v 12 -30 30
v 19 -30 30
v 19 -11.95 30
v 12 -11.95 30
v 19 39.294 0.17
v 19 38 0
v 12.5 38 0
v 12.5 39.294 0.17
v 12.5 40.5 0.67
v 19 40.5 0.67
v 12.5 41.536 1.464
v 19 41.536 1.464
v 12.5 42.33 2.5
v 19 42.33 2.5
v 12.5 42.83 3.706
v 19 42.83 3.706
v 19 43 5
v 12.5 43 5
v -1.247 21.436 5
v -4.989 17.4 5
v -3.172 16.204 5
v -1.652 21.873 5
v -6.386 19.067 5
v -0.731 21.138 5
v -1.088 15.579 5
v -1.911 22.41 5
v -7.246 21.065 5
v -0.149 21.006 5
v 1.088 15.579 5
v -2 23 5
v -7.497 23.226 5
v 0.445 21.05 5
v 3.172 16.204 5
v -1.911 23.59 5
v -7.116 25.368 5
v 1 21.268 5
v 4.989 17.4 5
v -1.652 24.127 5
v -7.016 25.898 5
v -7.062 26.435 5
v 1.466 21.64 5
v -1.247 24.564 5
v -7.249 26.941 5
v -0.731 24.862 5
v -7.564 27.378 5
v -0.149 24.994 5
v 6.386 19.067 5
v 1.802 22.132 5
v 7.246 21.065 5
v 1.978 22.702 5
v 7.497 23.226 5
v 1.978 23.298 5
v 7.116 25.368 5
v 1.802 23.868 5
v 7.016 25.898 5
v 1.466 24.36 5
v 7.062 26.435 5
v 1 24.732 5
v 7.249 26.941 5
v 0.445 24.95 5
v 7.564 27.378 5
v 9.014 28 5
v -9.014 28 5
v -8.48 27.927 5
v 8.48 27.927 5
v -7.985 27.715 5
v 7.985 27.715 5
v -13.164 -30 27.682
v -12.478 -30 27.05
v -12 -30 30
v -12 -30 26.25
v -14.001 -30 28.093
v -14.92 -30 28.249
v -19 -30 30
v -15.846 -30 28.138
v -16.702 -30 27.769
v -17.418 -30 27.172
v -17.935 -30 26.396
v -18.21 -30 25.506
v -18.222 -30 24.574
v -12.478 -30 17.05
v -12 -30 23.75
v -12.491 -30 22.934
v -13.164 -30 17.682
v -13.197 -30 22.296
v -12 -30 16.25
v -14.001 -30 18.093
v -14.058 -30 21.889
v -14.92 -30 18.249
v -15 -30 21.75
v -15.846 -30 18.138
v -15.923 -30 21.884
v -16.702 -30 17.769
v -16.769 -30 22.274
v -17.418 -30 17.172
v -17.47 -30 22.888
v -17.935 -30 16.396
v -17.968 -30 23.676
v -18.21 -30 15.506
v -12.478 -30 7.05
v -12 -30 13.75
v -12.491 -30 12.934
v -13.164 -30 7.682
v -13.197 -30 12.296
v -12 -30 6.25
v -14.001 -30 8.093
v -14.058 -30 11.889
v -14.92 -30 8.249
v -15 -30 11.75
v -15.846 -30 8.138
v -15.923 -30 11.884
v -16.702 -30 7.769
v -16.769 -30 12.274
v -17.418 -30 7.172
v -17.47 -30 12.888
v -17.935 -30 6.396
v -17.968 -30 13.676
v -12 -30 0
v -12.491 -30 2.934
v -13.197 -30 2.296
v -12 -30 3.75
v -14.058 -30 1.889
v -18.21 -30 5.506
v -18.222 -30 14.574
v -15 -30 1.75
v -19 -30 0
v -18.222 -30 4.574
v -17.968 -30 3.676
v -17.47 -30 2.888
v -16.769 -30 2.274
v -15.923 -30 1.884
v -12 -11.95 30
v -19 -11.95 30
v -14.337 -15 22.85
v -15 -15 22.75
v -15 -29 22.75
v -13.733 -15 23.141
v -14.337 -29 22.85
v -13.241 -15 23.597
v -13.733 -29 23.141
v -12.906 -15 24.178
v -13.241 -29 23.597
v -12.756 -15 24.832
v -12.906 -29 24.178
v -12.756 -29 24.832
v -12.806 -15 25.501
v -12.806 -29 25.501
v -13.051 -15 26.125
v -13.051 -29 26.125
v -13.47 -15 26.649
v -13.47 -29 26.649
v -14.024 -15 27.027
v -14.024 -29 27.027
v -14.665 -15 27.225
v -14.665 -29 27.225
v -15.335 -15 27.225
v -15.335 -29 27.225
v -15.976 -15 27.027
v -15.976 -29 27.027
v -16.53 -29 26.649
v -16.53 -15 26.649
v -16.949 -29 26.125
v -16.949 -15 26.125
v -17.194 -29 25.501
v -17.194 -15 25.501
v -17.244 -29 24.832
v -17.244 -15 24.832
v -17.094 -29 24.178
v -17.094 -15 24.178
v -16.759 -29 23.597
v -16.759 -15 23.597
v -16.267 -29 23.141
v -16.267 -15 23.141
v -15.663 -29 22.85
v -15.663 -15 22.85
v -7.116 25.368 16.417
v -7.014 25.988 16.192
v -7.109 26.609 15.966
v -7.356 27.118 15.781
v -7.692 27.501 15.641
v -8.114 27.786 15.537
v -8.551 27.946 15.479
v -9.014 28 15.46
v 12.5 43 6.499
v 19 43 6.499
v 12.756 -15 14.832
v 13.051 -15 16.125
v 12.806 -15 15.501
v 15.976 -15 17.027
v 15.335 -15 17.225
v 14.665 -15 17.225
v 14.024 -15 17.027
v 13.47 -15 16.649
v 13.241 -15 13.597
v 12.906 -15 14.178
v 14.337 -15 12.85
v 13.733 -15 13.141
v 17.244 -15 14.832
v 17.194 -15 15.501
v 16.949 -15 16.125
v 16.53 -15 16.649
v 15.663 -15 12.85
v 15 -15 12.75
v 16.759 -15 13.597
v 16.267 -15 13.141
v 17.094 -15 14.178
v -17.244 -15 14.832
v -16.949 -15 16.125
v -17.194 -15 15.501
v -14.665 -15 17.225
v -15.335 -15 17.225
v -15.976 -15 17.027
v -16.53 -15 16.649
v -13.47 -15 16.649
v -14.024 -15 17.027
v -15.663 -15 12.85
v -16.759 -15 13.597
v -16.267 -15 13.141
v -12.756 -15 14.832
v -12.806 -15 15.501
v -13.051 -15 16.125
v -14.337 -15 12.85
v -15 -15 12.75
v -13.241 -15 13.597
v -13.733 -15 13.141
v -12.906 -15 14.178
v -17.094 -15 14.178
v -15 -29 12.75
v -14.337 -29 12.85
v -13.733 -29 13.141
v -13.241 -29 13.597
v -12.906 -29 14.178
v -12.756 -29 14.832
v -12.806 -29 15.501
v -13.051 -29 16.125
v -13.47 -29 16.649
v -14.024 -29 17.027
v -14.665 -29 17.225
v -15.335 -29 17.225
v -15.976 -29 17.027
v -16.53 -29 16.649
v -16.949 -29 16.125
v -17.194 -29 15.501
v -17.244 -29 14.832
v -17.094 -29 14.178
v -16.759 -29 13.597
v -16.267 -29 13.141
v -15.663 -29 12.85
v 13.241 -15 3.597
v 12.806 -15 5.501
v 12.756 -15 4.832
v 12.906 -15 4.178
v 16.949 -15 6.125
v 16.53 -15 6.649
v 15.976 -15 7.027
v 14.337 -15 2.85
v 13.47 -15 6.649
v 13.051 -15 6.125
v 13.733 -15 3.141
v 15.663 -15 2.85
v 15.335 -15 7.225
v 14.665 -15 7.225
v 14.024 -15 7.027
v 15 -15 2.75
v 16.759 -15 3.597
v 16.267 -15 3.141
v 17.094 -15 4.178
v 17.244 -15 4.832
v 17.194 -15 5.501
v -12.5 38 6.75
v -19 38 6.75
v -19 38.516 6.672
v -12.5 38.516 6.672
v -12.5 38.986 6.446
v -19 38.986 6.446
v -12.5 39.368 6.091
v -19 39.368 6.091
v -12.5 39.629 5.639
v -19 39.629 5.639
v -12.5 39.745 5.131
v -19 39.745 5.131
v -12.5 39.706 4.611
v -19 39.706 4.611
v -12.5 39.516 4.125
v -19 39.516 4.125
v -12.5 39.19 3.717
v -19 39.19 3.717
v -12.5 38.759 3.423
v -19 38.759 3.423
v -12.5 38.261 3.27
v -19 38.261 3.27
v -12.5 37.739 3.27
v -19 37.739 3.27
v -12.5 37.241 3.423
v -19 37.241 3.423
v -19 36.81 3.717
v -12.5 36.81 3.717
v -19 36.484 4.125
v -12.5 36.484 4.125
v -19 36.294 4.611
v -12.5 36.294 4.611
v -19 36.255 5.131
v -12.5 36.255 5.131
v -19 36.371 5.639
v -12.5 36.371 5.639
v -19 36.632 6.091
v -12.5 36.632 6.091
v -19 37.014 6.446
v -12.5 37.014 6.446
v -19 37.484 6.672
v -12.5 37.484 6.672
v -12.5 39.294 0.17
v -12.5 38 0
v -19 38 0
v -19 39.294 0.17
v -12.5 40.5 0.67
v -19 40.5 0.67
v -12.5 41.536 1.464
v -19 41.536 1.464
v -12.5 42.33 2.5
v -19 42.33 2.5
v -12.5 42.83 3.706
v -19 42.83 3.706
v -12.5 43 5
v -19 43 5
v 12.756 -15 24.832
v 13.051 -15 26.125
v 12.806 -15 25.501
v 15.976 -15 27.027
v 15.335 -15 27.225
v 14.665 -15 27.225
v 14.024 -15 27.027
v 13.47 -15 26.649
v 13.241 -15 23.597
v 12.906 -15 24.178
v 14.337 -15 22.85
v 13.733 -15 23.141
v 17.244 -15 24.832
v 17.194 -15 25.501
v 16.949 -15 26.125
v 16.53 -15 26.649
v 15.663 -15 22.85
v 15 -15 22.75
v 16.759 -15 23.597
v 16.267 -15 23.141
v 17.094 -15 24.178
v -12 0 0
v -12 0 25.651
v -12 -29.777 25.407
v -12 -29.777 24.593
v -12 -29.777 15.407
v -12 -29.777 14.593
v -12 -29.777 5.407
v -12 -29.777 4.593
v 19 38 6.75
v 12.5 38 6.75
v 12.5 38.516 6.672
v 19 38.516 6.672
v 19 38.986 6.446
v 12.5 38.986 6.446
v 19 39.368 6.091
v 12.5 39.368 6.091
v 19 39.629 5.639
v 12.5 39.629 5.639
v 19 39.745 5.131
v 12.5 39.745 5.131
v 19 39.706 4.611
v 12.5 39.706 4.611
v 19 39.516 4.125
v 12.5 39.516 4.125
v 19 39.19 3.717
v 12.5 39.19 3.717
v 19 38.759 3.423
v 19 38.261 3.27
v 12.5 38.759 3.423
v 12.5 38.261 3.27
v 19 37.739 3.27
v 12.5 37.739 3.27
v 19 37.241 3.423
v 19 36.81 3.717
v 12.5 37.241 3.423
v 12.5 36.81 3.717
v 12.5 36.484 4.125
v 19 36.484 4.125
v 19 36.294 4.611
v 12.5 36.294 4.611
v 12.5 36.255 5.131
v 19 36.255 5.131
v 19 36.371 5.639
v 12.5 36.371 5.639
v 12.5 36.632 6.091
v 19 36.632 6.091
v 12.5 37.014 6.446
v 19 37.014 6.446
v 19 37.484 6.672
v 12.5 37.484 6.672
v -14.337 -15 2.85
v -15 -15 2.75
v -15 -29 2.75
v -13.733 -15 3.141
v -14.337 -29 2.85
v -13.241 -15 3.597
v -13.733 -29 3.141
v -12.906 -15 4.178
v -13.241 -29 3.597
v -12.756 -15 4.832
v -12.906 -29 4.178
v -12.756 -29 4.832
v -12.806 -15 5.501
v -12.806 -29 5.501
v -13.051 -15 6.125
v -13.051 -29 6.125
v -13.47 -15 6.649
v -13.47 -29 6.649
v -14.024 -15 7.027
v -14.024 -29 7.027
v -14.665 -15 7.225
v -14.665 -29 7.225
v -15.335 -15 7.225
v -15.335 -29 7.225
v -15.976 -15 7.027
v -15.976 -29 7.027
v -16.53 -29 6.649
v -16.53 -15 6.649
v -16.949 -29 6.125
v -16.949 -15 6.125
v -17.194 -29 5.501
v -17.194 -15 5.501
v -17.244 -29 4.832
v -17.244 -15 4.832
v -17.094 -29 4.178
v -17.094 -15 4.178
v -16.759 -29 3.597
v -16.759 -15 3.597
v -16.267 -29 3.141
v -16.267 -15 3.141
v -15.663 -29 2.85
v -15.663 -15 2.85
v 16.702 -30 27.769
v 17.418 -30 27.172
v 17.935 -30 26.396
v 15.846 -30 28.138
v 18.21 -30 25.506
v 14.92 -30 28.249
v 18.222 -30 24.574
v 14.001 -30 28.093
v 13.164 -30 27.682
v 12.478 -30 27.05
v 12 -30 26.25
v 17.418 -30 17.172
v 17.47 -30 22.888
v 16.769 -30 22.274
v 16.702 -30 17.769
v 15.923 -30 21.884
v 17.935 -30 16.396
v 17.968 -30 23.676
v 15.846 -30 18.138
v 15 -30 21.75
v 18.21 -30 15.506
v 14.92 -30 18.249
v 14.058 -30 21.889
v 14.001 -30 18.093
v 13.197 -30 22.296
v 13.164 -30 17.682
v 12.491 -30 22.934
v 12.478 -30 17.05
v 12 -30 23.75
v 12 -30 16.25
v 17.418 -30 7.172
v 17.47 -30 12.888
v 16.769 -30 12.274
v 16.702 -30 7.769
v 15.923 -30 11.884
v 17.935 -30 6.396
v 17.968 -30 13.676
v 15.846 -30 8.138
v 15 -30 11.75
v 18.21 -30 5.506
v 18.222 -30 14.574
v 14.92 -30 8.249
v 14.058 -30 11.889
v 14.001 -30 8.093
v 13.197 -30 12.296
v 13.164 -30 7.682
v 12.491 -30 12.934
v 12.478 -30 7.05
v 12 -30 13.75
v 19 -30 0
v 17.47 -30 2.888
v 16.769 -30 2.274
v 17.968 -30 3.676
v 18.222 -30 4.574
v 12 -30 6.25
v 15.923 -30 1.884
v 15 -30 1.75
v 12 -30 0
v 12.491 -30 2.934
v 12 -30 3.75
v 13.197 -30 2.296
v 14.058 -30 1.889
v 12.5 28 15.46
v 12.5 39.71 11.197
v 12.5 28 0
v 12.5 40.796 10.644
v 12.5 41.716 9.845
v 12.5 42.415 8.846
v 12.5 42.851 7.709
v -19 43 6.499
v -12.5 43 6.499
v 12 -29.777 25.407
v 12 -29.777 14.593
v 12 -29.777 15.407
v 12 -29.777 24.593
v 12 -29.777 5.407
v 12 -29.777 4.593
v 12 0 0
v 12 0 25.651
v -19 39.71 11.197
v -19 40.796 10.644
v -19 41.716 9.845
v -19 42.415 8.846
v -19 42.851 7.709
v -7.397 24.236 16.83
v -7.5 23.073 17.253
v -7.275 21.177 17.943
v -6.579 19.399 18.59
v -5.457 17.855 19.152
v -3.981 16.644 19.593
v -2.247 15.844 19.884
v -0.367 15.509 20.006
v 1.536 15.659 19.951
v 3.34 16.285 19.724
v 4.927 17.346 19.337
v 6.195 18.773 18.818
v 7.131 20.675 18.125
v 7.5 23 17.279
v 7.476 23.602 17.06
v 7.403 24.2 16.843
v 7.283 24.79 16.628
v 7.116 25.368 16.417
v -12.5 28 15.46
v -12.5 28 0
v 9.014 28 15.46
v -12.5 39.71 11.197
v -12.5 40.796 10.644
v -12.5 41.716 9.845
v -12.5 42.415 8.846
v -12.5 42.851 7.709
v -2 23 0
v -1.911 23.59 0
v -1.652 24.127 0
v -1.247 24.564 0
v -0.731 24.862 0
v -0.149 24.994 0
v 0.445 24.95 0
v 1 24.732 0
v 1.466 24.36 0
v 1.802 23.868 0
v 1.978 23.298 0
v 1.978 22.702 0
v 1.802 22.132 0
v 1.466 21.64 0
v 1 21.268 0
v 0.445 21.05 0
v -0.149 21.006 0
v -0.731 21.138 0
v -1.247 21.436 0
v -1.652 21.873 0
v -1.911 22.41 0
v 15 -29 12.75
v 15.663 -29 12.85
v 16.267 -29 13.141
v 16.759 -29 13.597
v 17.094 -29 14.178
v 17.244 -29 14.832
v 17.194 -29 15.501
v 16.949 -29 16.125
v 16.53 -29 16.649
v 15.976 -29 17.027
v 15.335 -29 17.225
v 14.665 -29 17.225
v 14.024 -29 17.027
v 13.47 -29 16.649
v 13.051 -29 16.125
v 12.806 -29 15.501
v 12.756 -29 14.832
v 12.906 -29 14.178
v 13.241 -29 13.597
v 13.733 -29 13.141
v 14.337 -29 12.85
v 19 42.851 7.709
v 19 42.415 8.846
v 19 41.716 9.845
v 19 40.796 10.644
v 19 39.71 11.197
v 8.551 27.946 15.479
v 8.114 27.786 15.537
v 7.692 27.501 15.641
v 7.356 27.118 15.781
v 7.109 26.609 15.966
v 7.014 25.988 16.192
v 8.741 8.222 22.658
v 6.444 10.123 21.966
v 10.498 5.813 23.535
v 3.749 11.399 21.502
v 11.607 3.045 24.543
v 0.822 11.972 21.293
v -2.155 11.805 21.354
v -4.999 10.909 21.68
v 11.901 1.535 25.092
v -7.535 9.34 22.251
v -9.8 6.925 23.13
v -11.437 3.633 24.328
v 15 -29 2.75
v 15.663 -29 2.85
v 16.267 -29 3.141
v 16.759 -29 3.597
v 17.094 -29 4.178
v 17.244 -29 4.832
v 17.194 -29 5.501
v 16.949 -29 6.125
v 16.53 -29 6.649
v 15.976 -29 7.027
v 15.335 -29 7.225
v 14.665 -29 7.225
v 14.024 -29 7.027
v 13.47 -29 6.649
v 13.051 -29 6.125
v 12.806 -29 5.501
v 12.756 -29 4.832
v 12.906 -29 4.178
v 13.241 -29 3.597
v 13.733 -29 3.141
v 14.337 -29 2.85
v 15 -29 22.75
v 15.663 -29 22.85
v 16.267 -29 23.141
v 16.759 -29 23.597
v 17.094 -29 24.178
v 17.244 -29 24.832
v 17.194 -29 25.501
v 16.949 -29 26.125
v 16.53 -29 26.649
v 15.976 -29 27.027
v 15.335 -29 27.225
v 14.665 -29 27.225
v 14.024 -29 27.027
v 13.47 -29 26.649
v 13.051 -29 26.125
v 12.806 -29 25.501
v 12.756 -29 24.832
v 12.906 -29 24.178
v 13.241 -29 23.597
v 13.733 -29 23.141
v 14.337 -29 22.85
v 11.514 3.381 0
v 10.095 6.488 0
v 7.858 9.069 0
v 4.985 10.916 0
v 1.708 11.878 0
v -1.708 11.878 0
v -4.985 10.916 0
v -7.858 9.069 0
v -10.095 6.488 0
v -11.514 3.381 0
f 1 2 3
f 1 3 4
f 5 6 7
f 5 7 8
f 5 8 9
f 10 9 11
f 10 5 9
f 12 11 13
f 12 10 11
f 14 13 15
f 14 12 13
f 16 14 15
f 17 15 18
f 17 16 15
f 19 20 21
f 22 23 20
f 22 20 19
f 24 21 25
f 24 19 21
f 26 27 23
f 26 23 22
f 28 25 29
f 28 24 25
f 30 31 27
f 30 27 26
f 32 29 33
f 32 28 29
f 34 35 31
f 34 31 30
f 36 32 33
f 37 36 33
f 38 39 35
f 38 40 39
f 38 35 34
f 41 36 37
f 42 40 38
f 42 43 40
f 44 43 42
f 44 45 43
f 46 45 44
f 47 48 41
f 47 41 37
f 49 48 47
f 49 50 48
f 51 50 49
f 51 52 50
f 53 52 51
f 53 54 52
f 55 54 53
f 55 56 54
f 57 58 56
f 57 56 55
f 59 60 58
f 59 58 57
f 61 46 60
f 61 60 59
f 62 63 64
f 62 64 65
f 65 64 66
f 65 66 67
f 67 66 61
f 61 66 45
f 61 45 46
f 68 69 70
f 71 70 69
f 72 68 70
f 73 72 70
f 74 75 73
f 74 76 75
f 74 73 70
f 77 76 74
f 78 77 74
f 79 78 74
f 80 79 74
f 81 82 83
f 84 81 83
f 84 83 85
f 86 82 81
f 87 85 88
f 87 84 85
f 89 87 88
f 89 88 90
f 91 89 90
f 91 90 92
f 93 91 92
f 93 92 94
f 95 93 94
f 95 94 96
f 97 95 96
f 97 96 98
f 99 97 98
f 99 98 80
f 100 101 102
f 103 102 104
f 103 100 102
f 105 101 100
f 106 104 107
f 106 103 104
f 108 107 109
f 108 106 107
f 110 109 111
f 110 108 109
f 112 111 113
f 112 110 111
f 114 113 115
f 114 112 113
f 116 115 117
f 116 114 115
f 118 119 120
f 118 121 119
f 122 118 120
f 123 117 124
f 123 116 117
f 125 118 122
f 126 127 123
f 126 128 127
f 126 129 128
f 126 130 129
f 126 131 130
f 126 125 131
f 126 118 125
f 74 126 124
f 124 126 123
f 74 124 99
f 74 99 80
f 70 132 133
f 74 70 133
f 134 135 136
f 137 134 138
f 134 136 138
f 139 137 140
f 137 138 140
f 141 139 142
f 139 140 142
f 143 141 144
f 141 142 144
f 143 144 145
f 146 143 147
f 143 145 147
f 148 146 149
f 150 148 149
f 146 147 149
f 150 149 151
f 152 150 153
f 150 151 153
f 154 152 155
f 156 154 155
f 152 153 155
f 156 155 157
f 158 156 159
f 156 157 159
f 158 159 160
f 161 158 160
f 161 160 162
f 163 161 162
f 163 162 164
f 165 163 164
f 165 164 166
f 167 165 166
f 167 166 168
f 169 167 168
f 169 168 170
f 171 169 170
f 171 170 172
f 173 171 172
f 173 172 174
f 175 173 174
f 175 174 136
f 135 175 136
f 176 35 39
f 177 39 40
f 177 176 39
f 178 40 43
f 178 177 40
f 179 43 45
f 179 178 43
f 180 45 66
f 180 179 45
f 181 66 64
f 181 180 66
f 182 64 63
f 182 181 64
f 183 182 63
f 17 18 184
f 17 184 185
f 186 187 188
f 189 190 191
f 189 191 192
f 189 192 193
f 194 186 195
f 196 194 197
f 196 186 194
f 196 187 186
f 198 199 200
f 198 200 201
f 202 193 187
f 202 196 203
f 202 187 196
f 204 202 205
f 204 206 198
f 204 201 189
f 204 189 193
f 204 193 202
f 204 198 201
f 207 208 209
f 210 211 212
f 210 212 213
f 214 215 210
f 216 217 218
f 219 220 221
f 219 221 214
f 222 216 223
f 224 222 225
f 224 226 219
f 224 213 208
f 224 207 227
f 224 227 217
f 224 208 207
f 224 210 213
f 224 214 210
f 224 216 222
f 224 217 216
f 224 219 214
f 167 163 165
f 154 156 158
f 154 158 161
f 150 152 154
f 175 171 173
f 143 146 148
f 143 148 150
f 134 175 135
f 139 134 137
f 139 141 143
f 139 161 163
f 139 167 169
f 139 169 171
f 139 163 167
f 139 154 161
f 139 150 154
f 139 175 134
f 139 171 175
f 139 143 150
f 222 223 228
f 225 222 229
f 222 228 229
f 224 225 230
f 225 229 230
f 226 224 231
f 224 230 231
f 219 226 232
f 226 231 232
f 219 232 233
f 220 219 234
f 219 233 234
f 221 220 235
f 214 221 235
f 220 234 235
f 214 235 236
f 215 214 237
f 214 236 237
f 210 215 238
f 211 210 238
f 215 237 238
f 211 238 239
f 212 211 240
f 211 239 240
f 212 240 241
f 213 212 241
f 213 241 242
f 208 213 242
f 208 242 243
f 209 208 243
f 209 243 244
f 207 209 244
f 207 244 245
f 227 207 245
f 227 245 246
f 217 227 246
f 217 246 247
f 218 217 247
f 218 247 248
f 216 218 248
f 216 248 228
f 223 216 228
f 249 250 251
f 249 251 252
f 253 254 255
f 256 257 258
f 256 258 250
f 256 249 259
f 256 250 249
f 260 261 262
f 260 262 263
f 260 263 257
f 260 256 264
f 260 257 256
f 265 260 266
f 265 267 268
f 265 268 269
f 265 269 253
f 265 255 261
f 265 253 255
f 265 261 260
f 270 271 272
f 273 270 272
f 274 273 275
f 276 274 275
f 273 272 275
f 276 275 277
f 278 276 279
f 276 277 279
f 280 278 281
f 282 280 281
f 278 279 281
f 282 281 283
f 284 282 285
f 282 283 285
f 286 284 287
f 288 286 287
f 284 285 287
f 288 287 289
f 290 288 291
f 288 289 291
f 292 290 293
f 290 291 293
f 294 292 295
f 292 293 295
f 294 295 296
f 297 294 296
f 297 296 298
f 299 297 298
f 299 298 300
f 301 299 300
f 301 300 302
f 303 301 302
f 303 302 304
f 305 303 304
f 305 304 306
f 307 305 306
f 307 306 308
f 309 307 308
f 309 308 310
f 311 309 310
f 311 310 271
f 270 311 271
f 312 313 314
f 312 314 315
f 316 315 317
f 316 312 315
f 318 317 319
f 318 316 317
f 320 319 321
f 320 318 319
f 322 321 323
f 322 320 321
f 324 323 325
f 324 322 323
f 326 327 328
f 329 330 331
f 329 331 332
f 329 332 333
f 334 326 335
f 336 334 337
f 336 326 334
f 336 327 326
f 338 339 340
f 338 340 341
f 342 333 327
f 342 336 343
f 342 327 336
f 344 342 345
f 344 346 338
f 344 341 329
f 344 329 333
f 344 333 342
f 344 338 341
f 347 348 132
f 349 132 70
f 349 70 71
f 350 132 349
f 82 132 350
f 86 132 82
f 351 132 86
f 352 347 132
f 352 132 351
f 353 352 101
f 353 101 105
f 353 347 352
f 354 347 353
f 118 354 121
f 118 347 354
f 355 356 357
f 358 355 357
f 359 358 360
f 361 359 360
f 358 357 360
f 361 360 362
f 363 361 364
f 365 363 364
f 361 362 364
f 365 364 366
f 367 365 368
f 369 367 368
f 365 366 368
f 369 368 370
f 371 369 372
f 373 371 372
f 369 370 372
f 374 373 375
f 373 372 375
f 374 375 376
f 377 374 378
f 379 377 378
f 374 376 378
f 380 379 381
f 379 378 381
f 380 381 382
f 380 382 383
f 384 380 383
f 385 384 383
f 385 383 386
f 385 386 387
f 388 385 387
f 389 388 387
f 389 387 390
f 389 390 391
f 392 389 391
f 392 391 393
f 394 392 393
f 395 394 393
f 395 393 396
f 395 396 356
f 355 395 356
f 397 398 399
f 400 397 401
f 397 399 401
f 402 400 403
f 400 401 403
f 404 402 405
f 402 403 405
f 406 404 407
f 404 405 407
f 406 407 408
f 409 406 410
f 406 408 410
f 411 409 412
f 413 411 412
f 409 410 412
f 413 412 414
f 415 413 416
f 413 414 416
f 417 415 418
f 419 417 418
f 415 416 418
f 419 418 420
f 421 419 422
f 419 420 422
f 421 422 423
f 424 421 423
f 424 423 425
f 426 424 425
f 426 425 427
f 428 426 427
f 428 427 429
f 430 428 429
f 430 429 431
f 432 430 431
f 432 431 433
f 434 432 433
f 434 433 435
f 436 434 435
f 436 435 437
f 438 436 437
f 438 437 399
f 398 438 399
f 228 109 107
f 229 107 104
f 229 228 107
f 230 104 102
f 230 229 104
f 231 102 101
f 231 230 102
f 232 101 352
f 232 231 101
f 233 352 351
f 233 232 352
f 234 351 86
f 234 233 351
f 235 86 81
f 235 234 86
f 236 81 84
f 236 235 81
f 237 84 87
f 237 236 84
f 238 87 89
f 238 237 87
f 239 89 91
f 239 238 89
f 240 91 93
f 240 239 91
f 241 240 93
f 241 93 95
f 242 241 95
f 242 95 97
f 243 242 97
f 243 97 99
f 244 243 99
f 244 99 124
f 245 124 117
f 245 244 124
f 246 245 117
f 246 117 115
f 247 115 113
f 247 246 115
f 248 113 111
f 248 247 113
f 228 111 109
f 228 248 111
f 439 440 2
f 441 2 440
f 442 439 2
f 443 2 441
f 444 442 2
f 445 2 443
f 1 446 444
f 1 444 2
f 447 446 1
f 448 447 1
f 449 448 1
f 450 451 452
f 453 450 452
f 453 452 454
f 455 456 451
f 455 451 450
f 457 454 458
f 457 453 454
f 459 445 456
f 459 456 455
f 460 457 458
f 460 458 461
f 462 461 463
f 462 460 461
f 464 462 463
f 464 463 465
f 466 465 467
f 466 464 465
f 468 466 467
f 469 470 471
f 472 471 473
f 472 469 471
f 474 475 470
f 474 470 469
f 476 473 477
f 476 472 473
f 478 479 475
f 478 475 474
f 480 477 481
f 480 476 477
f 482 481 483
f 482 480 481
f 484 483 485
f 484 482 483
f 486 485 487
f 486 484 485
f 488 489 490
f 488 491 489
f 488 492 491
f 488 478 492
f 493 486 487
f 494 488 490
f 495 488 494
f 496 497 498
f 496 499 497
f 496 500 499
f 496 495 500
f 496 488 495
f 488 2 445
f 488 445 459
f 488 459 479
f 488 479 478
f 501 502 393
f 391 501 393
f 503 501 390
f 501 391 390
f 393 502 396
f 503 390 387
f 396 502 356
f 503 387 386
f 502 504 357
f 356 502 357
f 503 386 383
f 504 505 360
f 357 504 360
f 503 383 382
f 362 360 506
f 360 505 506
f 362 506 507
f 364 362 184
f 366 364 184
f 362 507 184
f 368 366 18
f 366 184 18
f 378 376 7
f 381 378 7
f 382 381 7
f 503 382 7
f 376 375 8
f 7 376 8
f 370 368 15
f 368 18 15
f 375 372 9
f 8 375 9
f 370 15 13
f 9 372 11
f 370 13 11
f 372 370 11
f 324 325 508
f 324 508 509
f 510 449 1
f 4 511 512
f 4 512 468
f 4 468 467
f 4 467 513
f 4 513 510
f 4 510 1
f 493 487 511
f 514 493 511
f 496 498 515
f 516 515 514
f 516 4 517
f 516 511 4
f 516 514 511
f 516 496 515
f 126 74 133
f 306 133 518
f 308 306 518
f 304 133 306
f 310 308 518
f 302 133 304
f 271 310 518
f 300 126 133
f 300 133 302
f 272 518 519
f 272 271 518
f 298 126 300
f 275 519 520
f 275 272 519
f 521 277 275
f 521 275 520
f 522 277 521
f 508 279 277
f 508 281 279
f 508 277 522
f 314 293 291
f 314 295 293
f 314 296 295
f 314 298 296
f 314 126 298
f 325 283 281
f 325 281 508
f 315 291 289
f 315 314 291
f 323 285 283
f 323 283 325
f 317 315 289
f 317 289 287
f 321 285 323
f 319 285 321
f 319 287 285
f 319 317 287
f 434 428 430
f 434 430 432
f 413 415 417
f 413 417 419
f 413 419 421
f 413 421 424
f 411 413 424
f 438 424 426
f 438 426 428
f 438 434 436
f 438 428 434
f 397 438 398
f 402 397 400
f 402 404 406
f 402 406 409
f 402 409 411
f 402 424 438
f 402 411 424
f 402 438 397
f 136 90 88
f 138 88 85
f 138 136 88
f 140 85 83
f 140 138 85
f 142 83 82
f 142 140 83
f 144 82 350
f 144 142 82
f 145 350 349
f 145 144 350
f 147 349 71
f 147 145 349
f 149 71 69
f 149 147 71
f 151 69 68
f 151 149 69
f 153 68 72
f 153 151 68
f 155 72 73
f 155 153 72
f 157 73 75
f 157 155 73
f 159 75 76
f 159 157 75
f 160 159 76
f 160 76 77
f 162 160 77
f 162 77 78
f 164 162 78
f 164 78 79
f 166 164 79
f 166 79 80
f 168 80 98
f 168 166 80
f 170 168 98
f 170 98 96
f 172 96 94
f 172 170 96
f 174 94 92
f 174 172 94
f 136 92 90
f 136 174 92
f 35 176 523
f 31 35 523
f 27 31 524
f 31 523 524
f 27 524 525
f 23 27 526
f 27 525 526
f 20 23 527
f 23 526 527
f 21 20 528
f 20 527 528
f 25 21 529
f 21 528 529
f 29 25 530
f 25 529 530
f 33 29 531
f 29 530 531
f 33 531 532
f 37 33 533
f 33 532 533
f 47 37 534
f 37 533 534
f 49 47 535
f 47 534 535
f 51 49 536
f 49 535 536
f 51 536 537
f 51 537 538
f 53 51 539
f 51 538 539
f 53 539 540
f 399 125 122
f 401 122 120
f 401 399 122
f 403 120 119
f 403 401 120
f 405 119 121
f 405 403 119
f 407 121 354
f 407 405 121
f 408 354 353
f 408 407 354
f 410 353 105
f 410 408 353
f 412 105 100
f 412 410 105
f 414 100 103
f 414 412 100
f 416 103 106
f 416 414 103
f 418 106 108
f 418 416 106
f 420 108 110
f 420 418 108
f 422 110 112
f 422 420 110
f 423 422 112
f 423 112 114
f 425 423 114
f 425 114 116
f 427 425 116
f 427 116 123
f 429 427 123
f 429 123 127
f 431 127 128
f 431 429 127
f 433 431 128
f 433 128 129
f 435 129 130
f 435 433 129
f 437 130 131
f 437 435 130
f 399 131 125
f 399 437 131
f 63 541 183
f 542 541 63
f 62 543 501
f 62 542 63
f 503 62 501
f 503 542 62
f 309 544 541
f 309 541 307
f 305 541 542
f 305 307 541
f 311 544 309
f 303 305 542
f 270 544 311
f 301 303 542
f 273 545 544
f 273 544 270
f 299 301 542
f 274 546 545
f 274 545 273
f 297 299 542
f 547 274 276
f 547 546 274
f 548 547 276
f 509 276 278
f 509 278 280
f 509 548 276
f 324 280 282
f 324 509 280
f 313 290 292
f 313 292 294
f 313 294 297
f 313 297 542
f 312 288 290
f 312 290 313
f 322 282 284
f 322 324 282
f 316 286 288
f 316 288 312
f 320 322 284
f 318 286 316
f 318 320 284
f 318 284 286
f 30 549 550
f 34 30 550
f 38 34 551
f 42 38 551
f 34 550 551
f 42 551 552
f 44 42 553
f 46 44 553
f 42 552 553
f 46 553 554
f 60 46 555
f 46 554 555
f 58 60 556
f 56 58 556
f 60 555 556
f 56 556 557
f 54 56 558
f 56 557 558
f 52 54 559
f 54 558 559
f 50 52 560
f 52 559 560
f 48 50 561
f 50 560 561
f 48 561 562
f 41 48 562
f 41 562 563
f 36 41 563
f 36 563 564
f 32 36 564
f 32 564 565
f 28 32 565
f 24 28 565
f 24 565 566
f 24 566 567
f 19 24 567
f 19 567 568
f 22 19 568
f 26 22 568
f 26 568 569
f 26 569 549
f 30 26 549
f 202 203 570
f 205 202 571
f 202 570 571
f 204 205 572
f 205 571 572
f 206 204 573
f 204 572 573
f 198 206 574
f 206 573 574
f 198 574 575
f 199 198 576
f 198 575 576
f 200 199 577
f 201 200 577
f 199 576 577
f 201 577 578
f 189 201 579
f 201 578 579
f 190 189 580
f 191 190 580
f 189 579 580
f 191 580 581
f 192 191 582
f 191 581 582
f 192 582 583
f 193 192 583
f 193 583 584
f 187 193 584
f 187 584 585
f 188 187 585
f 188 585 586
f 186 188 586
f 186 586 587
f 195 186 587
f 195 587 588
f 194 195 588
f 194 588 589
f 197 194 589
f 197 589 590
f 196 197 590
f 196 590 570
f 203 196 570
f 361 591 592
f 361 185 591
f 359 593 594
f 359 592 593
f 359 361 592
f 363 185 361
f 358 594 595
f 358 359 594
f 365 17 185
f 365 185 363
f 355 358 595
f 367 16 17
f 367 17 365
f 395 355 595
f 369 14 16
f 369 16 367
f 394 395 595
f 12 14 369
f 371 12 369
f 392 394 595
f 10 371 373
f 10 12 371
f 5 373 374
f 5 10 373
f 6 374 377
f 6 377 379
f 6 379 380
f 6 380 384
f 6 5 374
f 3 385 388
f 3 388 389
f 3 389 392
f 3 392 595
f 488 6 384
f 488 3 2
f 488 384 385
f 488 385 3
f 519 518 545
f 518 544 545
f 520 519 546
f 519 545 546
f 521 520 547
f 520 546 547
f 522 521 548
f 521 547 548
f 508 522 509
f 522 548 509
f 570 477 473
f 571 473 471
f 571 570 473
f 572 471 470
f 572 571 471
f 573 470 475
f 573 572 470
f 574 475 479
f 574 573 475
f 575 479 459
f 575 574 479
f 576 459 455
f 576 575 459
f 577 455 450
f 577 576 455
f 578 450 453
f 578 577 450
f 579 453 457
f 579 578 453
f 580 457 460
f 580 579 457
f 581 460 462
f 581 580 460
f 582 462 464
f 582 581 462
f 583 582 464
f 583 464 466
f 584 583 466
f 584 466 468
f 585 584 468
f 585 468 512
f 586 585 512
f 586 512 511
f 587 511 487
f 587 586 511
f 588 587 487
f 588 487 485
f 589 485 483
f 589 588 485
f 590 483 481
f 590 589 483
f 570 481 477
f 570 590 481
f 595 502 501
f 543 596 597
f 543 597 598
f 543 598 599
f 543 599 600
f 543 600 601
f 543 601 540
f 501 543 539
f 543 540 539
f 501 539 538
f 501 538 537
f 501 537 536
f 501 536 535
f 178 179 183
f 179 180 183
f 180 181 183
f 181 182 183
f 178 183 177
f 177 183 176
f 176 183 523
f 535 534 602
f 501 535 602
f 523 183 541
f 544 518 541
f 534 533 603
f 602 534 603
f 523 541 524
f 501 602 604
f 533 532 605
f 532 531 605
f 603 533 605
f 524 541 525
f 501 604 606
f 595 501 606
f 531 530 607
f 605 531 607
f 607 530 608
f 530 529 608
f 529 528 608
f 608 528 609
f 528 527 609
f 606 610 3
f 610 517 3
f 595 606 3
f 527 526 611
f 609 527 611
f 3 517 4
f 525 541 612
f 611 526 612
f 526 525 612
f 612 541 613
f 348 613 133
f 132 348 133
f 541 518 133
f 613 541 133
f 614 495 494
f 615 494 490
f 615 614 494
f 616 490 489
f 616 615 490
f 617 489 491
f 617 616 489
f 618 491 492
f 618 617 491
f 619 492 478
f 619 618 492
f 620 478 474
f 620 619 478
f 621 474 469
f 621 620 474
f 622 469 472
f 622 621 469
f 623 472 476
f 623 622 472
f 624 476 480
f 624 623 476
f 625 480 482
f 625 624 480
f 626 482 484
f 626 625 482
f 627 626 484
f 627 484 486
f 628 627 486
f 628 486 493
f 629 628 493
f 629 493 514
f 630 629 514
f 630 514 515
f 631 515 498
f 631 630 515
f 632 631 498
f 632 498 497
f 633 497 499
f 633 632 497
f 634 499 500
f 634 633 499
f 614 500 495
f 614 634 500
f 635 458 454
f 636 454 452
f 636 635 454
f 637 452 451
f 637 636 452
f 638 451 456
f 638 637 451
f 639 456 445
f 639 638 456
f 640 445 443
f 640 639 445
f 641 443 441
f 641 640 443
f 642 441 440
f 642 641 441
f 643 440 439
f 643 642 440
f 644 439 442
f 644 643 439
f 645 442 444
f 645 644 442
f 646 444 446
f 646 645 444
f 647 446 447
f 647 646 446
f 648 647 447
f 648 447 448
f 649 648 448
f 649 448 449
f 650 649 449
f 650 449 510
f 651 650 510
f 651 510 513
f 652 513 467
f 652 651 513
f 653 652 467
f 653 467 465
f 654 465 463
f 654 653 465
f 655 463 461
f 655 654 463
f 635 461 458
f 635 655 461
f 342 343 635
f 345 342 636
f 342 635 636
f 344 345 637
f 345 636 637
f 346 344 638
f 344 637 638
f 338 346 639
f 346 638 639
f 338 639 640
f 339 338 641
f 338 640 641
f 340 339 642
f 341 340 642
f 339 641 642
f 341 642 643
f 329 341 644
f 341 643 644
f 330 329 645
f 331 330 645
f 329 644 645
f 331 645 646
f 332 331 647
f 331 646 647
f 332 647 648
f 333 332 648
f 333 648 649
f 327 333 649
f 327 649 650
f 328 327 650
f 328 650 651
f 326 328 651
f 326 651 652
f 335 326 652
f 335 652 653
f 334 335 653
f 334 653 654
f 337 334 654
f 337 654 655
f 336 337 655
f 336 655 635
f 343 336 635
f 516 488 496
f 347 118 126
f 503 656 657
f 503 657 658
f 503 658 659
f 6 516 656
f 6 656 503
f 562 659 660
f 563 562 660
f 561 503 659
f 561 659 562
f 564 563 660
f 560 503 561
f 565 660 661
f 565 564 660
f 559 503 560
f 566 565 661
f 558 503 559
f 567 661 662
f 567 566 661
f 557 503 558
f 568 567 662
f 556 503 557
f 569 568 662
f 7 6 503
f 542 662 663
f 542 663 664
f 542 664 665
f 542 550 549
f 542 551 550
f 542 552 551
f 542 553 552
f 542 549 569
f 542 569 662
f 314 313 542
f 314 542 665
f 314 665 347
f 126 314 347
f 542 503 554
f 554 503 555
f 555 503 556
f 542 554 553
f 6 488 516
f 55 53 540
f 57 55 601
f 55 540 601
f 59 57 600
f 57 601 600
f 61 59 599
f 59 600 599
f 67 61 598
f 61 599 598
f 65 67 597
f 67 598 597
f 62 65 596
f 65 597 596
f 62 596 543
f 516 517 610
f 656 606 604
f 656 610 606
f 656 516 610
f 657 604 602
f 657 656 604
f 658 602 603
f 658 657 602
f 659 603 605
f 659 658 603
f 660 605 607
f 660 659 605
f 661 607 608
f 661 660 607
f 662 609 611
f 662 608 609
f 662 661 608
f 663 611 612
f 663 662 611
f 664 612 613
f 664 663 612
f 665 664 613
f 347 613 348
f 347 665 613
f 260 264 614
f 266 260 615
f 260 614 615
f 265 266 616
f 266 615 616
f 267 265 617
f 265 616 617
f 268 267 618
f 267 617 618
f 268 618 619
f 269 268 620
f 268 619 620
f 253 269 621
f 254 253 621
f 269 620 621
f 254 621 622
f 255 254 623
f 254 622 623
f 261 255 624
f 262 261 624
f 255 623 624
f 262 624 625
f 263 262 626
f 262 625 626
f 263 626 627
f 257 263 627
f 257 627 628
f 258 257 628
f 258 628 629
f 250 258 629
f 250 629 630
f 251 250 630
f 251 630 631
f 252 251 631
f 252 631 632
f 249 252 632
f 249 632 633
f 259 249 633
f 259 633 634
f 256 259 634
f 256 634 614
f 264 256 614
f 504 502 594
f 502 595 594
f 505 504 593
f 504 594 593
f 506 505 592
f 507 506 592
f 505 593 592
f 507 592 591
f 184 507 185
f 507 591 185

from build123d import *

# Parameters (mm, degrees)
BOSS_EXTRUDE1_DEPTH = 30
SKETCH2_R           = 2.25
CUT_EXTRUDE1_DEPTH  = 15
FILLET1_R           = 5
CHAMFER1_SIZE       = 20
CHAMFER1_SIZE_2     = 54.949548389
SKETCH3_W           = 25
SKETCH3_H           = 39.596952294
CUT_EXTRUDE2_DEPTH  = 15
SKETCH4_R           = 1.75
CUT_EXTRUDE3_DEPTH  = 65.75337829
CHAMFER2_SIZE       = 1
SKETCH5_R           = 2
CUT_EXTRUDE4_DEPTH  = 56.767373974
SKETCH6_R           = 7.5
CUT_EXTRUDE5_DEPTH  = 25
FILLET2_R           = 2
FILLET3_R           = 5


with BuildPart() as part:
    # Sketch1 → Boss-Extrude1 (new body)
    with BuildSketch(Plane.XY):
        with BuildLine():
            Line((-12, 0), (-12, -30))
            Line((-12, -30), (-19, -30))
            Line((-19, -30), (-19, 43))
            Line((-19, 43), (19, 43))
            Line((19, 43), (19, -30))
            Line((19, -30), (12, -30))
            Line((12, -30), (12, 0))
            ThreePointArc((12, 0), (0, 12), (-12, 0))
        make_face()
    extrude(amount=BOSS_EXTRUDE1_DEPTH)

    # Sketch2 → Cut-Extrude1 (cut)
    with BuildSketch(Plane.XZ.offset(30)):
        with Locations(Location((-15, 5, 0), (0, 0, 270))):
            Circle(SKETCH2_R)
        with Locations(Location((15, 5, 0), (0, 0, 270))):
            Circle(SKETCH2_R)
        with Locations(Location((-15, 15, 0), (0, 0, 270))):
            Circle(SKETCH2_R)
        with Locations(Location((15, 15, 0), (0, 0, 270))):
            Circle(SKETCH2_R)
        with Locations(Location((-15, 25, 0), (0, 0, 270))):
            Circle(SKETCH2_R)
        with Locations(Location((15, 25, 0), (0, 0, 270))):
            Circle(SKETCH2_R)
    extrude(amount=-CUT_EXTRUDE1_DEPTH, mode=Mode.SUBTRACT)

    # Fillet1
    fillet1_edges = [part.edges().sort_by_distance(p)[0] for p in [
        (0, 43, 0),
    ]]
    fillet(fillet1_edges, radius=FILLET1_R)

    # Chamfer1
    # the kernel refuses this chamfer: 54.949548389, 20 mm, written as the material it takes off along each edge
    with BuildSketch(Plane(origin=(-161.549828987, 43, 30), x_dir=(0, 0.09904090225205052, -0.9950833631817486), z_dir=(1, 0, 0))) as chamfer1_piece_1:
        Polygon((CHAMFER1_SIZE * 0.995083363182, -CHAMFER1_SIZE * 0.0990409022521), (-CHAMFER1_SIZE_2 * 0.0990409022522, -CHAMFER1_SIZE_2 * 0.995083363183), (0, 0), align=None)
    extrude(amount=323.099657974, mode=Mode.SUBTRACT)

    # Sketch3 → Cut-Extrude2 (cut)
    with BuildSketch(Plane(origin=(0, 43, 0), x_dir=(1, 0, 0), z_dir=(0, 1, 0))):
        Rectangle(SKETCH3_W, SKETCH3_H)
    extrude(amount=-CUT_EXTRUDE2_DEPTH, mode=Mode.SUBTRACT)

    # Sketch4 → Cut-Extrude3 (cut, through all)
    with BuildSketch(Plane.ZY.offset(19)):
        with Locations((5, 38)):
            Circle(SKETCH4_R)
    extrude(amount=-CUT_EXTRUDE3_DEPTH, mode=Mode.SUBTRACT)

    # Chamfer2
    # the kernel refuses this chamfer: 1 mm, written as the material it takes off along each edge
    with BuildSketch(Plane(origin=(-15, -30, 25), x_dir=(0, 0, -1), z_dir=(-1, 0, 0))) as chamfer2_piece_1:
        Polygon((2.25 + CHAMFER2_SIZE, 0), (2.25, -CHAMFER2_SIZE), (2.25, 0), align=None)
    revolve(axis=Axis((-15, -30, 25), (0, -1, 0)), mode=Mode.SUBTRACT)
    with BuildSketch(Plane(origin=(15, -30, 15), x_dir=(0, 0, -1), z_dir=(-1, 0, 0))) as chamfer2_piece_2:
        Polygon((2.25 + CHAMFER2_SIZE, 0), (2.25, -CHAMFER2_SIZE), (2.25, 0), align=None)
    revolve(axis=Axis((15, -30, 15), (0, -1, 0)), mode=Mode.SUBTRACT)
    with BuildSketch(Plane(origin=(-15, -30, 15), x_dir=(0, 0, -1), z_dir=(-1, 0, 0))) as chamfer2_piece_3:
        Polygon((2.25 + CHAMFER2_SIZE, 0), (2.25, -CHAMFER2_SIZE), (2.25, 0), align=None)
    revolve(axis=Axis((-15, -30, 15), (0, -1, 0)), mode=Mode.SUBTRACT)
    with BuildSketch(Plane(origin=(15, -30, 5), x_dir=(0, 0, -1), z_dir=(-1, 0, 0))) as chamfer2_piece_4:
        Polygon((2.25 + CHAMFER2_SIZE, 0), (2.25, -CHAMFER2_SIZE), (2.25, 0), align=None)
    revolve(axis=Axis((15, -30, 5), (0, -1, 0)), mode=Mode.SUBTRACT)
    with BuildSketch(Plane(origin=(15, -30, 25), x_dir=(0, 0, -1), z_dir=(-1, 0, 0))) as chamfer2_piece_5:
        Polygon((2.25 + CHAMFER2_SIZE, 0), (2.25, -CHAMFER2_SIZE), (2.25, 0), align=None)
    revolve(axis=Axis((15, -30, 25), (0, -1, 0)), mode=Mode.SUBTRACT)
    with BuildSketch(Plane(origin=(-15, -30, 5), x_dir=(0, 0, -1), z_dir=(-1, 0, 0))) as chamfer2_piece_6:
        Polygon((2.25 + CHAMFER2_SIZE, 0), (2.25, -CHAMFER2_SIZE), (2.25, 0), align=None)
    revolve(axis=Axis((-15, -30, 5), (0, -1, 0)), mode=Mode.SUBTRACT)

    # Sketch5 → Cut-Extrude4 (cut, through all)
    with BuildSketch(Plane(origin=(0, 0, 0), x_dir=(-1, 0, 0), z_dir=(0, 0, -1))):
        with Locations((0, 23)):
            Circle(SKETCH5_R)
    extrude(amount=-CUT_EXTRUDE4_DEPTH, mode=Mode.SUBTRACT)

    # Sketch6 → Cut-Extrude5 (cut)
    with BuildSketch(Plane.XY.offset(30)):
        with Locations((0, 23)):
            Circle(SKETCH6_R)
    extrude(amount=-CUT_EXTRUDE5_DEPTH, mode=Mode.SUBTRACT)

    # Fillet2
    fillet2_edges = [part.edges().sort_by_distance(p)[0] for p in [
        (-5.590169944, 28, 10.229776757),
        (5.590169944, 28, 10.229776757),
    ]]
    fillet(fillet2_edges, radius=FILLET2_R)

    # Fillet3
    fillet3_edges = [part.edges().sort_by_distance(p)[0] for p in [
        (-15.75, 43, 10),
        (15.75, 43, 10),
    ]]
    fillet(fillet3_edges, radius=FILLET3_R)


solid = part.part
